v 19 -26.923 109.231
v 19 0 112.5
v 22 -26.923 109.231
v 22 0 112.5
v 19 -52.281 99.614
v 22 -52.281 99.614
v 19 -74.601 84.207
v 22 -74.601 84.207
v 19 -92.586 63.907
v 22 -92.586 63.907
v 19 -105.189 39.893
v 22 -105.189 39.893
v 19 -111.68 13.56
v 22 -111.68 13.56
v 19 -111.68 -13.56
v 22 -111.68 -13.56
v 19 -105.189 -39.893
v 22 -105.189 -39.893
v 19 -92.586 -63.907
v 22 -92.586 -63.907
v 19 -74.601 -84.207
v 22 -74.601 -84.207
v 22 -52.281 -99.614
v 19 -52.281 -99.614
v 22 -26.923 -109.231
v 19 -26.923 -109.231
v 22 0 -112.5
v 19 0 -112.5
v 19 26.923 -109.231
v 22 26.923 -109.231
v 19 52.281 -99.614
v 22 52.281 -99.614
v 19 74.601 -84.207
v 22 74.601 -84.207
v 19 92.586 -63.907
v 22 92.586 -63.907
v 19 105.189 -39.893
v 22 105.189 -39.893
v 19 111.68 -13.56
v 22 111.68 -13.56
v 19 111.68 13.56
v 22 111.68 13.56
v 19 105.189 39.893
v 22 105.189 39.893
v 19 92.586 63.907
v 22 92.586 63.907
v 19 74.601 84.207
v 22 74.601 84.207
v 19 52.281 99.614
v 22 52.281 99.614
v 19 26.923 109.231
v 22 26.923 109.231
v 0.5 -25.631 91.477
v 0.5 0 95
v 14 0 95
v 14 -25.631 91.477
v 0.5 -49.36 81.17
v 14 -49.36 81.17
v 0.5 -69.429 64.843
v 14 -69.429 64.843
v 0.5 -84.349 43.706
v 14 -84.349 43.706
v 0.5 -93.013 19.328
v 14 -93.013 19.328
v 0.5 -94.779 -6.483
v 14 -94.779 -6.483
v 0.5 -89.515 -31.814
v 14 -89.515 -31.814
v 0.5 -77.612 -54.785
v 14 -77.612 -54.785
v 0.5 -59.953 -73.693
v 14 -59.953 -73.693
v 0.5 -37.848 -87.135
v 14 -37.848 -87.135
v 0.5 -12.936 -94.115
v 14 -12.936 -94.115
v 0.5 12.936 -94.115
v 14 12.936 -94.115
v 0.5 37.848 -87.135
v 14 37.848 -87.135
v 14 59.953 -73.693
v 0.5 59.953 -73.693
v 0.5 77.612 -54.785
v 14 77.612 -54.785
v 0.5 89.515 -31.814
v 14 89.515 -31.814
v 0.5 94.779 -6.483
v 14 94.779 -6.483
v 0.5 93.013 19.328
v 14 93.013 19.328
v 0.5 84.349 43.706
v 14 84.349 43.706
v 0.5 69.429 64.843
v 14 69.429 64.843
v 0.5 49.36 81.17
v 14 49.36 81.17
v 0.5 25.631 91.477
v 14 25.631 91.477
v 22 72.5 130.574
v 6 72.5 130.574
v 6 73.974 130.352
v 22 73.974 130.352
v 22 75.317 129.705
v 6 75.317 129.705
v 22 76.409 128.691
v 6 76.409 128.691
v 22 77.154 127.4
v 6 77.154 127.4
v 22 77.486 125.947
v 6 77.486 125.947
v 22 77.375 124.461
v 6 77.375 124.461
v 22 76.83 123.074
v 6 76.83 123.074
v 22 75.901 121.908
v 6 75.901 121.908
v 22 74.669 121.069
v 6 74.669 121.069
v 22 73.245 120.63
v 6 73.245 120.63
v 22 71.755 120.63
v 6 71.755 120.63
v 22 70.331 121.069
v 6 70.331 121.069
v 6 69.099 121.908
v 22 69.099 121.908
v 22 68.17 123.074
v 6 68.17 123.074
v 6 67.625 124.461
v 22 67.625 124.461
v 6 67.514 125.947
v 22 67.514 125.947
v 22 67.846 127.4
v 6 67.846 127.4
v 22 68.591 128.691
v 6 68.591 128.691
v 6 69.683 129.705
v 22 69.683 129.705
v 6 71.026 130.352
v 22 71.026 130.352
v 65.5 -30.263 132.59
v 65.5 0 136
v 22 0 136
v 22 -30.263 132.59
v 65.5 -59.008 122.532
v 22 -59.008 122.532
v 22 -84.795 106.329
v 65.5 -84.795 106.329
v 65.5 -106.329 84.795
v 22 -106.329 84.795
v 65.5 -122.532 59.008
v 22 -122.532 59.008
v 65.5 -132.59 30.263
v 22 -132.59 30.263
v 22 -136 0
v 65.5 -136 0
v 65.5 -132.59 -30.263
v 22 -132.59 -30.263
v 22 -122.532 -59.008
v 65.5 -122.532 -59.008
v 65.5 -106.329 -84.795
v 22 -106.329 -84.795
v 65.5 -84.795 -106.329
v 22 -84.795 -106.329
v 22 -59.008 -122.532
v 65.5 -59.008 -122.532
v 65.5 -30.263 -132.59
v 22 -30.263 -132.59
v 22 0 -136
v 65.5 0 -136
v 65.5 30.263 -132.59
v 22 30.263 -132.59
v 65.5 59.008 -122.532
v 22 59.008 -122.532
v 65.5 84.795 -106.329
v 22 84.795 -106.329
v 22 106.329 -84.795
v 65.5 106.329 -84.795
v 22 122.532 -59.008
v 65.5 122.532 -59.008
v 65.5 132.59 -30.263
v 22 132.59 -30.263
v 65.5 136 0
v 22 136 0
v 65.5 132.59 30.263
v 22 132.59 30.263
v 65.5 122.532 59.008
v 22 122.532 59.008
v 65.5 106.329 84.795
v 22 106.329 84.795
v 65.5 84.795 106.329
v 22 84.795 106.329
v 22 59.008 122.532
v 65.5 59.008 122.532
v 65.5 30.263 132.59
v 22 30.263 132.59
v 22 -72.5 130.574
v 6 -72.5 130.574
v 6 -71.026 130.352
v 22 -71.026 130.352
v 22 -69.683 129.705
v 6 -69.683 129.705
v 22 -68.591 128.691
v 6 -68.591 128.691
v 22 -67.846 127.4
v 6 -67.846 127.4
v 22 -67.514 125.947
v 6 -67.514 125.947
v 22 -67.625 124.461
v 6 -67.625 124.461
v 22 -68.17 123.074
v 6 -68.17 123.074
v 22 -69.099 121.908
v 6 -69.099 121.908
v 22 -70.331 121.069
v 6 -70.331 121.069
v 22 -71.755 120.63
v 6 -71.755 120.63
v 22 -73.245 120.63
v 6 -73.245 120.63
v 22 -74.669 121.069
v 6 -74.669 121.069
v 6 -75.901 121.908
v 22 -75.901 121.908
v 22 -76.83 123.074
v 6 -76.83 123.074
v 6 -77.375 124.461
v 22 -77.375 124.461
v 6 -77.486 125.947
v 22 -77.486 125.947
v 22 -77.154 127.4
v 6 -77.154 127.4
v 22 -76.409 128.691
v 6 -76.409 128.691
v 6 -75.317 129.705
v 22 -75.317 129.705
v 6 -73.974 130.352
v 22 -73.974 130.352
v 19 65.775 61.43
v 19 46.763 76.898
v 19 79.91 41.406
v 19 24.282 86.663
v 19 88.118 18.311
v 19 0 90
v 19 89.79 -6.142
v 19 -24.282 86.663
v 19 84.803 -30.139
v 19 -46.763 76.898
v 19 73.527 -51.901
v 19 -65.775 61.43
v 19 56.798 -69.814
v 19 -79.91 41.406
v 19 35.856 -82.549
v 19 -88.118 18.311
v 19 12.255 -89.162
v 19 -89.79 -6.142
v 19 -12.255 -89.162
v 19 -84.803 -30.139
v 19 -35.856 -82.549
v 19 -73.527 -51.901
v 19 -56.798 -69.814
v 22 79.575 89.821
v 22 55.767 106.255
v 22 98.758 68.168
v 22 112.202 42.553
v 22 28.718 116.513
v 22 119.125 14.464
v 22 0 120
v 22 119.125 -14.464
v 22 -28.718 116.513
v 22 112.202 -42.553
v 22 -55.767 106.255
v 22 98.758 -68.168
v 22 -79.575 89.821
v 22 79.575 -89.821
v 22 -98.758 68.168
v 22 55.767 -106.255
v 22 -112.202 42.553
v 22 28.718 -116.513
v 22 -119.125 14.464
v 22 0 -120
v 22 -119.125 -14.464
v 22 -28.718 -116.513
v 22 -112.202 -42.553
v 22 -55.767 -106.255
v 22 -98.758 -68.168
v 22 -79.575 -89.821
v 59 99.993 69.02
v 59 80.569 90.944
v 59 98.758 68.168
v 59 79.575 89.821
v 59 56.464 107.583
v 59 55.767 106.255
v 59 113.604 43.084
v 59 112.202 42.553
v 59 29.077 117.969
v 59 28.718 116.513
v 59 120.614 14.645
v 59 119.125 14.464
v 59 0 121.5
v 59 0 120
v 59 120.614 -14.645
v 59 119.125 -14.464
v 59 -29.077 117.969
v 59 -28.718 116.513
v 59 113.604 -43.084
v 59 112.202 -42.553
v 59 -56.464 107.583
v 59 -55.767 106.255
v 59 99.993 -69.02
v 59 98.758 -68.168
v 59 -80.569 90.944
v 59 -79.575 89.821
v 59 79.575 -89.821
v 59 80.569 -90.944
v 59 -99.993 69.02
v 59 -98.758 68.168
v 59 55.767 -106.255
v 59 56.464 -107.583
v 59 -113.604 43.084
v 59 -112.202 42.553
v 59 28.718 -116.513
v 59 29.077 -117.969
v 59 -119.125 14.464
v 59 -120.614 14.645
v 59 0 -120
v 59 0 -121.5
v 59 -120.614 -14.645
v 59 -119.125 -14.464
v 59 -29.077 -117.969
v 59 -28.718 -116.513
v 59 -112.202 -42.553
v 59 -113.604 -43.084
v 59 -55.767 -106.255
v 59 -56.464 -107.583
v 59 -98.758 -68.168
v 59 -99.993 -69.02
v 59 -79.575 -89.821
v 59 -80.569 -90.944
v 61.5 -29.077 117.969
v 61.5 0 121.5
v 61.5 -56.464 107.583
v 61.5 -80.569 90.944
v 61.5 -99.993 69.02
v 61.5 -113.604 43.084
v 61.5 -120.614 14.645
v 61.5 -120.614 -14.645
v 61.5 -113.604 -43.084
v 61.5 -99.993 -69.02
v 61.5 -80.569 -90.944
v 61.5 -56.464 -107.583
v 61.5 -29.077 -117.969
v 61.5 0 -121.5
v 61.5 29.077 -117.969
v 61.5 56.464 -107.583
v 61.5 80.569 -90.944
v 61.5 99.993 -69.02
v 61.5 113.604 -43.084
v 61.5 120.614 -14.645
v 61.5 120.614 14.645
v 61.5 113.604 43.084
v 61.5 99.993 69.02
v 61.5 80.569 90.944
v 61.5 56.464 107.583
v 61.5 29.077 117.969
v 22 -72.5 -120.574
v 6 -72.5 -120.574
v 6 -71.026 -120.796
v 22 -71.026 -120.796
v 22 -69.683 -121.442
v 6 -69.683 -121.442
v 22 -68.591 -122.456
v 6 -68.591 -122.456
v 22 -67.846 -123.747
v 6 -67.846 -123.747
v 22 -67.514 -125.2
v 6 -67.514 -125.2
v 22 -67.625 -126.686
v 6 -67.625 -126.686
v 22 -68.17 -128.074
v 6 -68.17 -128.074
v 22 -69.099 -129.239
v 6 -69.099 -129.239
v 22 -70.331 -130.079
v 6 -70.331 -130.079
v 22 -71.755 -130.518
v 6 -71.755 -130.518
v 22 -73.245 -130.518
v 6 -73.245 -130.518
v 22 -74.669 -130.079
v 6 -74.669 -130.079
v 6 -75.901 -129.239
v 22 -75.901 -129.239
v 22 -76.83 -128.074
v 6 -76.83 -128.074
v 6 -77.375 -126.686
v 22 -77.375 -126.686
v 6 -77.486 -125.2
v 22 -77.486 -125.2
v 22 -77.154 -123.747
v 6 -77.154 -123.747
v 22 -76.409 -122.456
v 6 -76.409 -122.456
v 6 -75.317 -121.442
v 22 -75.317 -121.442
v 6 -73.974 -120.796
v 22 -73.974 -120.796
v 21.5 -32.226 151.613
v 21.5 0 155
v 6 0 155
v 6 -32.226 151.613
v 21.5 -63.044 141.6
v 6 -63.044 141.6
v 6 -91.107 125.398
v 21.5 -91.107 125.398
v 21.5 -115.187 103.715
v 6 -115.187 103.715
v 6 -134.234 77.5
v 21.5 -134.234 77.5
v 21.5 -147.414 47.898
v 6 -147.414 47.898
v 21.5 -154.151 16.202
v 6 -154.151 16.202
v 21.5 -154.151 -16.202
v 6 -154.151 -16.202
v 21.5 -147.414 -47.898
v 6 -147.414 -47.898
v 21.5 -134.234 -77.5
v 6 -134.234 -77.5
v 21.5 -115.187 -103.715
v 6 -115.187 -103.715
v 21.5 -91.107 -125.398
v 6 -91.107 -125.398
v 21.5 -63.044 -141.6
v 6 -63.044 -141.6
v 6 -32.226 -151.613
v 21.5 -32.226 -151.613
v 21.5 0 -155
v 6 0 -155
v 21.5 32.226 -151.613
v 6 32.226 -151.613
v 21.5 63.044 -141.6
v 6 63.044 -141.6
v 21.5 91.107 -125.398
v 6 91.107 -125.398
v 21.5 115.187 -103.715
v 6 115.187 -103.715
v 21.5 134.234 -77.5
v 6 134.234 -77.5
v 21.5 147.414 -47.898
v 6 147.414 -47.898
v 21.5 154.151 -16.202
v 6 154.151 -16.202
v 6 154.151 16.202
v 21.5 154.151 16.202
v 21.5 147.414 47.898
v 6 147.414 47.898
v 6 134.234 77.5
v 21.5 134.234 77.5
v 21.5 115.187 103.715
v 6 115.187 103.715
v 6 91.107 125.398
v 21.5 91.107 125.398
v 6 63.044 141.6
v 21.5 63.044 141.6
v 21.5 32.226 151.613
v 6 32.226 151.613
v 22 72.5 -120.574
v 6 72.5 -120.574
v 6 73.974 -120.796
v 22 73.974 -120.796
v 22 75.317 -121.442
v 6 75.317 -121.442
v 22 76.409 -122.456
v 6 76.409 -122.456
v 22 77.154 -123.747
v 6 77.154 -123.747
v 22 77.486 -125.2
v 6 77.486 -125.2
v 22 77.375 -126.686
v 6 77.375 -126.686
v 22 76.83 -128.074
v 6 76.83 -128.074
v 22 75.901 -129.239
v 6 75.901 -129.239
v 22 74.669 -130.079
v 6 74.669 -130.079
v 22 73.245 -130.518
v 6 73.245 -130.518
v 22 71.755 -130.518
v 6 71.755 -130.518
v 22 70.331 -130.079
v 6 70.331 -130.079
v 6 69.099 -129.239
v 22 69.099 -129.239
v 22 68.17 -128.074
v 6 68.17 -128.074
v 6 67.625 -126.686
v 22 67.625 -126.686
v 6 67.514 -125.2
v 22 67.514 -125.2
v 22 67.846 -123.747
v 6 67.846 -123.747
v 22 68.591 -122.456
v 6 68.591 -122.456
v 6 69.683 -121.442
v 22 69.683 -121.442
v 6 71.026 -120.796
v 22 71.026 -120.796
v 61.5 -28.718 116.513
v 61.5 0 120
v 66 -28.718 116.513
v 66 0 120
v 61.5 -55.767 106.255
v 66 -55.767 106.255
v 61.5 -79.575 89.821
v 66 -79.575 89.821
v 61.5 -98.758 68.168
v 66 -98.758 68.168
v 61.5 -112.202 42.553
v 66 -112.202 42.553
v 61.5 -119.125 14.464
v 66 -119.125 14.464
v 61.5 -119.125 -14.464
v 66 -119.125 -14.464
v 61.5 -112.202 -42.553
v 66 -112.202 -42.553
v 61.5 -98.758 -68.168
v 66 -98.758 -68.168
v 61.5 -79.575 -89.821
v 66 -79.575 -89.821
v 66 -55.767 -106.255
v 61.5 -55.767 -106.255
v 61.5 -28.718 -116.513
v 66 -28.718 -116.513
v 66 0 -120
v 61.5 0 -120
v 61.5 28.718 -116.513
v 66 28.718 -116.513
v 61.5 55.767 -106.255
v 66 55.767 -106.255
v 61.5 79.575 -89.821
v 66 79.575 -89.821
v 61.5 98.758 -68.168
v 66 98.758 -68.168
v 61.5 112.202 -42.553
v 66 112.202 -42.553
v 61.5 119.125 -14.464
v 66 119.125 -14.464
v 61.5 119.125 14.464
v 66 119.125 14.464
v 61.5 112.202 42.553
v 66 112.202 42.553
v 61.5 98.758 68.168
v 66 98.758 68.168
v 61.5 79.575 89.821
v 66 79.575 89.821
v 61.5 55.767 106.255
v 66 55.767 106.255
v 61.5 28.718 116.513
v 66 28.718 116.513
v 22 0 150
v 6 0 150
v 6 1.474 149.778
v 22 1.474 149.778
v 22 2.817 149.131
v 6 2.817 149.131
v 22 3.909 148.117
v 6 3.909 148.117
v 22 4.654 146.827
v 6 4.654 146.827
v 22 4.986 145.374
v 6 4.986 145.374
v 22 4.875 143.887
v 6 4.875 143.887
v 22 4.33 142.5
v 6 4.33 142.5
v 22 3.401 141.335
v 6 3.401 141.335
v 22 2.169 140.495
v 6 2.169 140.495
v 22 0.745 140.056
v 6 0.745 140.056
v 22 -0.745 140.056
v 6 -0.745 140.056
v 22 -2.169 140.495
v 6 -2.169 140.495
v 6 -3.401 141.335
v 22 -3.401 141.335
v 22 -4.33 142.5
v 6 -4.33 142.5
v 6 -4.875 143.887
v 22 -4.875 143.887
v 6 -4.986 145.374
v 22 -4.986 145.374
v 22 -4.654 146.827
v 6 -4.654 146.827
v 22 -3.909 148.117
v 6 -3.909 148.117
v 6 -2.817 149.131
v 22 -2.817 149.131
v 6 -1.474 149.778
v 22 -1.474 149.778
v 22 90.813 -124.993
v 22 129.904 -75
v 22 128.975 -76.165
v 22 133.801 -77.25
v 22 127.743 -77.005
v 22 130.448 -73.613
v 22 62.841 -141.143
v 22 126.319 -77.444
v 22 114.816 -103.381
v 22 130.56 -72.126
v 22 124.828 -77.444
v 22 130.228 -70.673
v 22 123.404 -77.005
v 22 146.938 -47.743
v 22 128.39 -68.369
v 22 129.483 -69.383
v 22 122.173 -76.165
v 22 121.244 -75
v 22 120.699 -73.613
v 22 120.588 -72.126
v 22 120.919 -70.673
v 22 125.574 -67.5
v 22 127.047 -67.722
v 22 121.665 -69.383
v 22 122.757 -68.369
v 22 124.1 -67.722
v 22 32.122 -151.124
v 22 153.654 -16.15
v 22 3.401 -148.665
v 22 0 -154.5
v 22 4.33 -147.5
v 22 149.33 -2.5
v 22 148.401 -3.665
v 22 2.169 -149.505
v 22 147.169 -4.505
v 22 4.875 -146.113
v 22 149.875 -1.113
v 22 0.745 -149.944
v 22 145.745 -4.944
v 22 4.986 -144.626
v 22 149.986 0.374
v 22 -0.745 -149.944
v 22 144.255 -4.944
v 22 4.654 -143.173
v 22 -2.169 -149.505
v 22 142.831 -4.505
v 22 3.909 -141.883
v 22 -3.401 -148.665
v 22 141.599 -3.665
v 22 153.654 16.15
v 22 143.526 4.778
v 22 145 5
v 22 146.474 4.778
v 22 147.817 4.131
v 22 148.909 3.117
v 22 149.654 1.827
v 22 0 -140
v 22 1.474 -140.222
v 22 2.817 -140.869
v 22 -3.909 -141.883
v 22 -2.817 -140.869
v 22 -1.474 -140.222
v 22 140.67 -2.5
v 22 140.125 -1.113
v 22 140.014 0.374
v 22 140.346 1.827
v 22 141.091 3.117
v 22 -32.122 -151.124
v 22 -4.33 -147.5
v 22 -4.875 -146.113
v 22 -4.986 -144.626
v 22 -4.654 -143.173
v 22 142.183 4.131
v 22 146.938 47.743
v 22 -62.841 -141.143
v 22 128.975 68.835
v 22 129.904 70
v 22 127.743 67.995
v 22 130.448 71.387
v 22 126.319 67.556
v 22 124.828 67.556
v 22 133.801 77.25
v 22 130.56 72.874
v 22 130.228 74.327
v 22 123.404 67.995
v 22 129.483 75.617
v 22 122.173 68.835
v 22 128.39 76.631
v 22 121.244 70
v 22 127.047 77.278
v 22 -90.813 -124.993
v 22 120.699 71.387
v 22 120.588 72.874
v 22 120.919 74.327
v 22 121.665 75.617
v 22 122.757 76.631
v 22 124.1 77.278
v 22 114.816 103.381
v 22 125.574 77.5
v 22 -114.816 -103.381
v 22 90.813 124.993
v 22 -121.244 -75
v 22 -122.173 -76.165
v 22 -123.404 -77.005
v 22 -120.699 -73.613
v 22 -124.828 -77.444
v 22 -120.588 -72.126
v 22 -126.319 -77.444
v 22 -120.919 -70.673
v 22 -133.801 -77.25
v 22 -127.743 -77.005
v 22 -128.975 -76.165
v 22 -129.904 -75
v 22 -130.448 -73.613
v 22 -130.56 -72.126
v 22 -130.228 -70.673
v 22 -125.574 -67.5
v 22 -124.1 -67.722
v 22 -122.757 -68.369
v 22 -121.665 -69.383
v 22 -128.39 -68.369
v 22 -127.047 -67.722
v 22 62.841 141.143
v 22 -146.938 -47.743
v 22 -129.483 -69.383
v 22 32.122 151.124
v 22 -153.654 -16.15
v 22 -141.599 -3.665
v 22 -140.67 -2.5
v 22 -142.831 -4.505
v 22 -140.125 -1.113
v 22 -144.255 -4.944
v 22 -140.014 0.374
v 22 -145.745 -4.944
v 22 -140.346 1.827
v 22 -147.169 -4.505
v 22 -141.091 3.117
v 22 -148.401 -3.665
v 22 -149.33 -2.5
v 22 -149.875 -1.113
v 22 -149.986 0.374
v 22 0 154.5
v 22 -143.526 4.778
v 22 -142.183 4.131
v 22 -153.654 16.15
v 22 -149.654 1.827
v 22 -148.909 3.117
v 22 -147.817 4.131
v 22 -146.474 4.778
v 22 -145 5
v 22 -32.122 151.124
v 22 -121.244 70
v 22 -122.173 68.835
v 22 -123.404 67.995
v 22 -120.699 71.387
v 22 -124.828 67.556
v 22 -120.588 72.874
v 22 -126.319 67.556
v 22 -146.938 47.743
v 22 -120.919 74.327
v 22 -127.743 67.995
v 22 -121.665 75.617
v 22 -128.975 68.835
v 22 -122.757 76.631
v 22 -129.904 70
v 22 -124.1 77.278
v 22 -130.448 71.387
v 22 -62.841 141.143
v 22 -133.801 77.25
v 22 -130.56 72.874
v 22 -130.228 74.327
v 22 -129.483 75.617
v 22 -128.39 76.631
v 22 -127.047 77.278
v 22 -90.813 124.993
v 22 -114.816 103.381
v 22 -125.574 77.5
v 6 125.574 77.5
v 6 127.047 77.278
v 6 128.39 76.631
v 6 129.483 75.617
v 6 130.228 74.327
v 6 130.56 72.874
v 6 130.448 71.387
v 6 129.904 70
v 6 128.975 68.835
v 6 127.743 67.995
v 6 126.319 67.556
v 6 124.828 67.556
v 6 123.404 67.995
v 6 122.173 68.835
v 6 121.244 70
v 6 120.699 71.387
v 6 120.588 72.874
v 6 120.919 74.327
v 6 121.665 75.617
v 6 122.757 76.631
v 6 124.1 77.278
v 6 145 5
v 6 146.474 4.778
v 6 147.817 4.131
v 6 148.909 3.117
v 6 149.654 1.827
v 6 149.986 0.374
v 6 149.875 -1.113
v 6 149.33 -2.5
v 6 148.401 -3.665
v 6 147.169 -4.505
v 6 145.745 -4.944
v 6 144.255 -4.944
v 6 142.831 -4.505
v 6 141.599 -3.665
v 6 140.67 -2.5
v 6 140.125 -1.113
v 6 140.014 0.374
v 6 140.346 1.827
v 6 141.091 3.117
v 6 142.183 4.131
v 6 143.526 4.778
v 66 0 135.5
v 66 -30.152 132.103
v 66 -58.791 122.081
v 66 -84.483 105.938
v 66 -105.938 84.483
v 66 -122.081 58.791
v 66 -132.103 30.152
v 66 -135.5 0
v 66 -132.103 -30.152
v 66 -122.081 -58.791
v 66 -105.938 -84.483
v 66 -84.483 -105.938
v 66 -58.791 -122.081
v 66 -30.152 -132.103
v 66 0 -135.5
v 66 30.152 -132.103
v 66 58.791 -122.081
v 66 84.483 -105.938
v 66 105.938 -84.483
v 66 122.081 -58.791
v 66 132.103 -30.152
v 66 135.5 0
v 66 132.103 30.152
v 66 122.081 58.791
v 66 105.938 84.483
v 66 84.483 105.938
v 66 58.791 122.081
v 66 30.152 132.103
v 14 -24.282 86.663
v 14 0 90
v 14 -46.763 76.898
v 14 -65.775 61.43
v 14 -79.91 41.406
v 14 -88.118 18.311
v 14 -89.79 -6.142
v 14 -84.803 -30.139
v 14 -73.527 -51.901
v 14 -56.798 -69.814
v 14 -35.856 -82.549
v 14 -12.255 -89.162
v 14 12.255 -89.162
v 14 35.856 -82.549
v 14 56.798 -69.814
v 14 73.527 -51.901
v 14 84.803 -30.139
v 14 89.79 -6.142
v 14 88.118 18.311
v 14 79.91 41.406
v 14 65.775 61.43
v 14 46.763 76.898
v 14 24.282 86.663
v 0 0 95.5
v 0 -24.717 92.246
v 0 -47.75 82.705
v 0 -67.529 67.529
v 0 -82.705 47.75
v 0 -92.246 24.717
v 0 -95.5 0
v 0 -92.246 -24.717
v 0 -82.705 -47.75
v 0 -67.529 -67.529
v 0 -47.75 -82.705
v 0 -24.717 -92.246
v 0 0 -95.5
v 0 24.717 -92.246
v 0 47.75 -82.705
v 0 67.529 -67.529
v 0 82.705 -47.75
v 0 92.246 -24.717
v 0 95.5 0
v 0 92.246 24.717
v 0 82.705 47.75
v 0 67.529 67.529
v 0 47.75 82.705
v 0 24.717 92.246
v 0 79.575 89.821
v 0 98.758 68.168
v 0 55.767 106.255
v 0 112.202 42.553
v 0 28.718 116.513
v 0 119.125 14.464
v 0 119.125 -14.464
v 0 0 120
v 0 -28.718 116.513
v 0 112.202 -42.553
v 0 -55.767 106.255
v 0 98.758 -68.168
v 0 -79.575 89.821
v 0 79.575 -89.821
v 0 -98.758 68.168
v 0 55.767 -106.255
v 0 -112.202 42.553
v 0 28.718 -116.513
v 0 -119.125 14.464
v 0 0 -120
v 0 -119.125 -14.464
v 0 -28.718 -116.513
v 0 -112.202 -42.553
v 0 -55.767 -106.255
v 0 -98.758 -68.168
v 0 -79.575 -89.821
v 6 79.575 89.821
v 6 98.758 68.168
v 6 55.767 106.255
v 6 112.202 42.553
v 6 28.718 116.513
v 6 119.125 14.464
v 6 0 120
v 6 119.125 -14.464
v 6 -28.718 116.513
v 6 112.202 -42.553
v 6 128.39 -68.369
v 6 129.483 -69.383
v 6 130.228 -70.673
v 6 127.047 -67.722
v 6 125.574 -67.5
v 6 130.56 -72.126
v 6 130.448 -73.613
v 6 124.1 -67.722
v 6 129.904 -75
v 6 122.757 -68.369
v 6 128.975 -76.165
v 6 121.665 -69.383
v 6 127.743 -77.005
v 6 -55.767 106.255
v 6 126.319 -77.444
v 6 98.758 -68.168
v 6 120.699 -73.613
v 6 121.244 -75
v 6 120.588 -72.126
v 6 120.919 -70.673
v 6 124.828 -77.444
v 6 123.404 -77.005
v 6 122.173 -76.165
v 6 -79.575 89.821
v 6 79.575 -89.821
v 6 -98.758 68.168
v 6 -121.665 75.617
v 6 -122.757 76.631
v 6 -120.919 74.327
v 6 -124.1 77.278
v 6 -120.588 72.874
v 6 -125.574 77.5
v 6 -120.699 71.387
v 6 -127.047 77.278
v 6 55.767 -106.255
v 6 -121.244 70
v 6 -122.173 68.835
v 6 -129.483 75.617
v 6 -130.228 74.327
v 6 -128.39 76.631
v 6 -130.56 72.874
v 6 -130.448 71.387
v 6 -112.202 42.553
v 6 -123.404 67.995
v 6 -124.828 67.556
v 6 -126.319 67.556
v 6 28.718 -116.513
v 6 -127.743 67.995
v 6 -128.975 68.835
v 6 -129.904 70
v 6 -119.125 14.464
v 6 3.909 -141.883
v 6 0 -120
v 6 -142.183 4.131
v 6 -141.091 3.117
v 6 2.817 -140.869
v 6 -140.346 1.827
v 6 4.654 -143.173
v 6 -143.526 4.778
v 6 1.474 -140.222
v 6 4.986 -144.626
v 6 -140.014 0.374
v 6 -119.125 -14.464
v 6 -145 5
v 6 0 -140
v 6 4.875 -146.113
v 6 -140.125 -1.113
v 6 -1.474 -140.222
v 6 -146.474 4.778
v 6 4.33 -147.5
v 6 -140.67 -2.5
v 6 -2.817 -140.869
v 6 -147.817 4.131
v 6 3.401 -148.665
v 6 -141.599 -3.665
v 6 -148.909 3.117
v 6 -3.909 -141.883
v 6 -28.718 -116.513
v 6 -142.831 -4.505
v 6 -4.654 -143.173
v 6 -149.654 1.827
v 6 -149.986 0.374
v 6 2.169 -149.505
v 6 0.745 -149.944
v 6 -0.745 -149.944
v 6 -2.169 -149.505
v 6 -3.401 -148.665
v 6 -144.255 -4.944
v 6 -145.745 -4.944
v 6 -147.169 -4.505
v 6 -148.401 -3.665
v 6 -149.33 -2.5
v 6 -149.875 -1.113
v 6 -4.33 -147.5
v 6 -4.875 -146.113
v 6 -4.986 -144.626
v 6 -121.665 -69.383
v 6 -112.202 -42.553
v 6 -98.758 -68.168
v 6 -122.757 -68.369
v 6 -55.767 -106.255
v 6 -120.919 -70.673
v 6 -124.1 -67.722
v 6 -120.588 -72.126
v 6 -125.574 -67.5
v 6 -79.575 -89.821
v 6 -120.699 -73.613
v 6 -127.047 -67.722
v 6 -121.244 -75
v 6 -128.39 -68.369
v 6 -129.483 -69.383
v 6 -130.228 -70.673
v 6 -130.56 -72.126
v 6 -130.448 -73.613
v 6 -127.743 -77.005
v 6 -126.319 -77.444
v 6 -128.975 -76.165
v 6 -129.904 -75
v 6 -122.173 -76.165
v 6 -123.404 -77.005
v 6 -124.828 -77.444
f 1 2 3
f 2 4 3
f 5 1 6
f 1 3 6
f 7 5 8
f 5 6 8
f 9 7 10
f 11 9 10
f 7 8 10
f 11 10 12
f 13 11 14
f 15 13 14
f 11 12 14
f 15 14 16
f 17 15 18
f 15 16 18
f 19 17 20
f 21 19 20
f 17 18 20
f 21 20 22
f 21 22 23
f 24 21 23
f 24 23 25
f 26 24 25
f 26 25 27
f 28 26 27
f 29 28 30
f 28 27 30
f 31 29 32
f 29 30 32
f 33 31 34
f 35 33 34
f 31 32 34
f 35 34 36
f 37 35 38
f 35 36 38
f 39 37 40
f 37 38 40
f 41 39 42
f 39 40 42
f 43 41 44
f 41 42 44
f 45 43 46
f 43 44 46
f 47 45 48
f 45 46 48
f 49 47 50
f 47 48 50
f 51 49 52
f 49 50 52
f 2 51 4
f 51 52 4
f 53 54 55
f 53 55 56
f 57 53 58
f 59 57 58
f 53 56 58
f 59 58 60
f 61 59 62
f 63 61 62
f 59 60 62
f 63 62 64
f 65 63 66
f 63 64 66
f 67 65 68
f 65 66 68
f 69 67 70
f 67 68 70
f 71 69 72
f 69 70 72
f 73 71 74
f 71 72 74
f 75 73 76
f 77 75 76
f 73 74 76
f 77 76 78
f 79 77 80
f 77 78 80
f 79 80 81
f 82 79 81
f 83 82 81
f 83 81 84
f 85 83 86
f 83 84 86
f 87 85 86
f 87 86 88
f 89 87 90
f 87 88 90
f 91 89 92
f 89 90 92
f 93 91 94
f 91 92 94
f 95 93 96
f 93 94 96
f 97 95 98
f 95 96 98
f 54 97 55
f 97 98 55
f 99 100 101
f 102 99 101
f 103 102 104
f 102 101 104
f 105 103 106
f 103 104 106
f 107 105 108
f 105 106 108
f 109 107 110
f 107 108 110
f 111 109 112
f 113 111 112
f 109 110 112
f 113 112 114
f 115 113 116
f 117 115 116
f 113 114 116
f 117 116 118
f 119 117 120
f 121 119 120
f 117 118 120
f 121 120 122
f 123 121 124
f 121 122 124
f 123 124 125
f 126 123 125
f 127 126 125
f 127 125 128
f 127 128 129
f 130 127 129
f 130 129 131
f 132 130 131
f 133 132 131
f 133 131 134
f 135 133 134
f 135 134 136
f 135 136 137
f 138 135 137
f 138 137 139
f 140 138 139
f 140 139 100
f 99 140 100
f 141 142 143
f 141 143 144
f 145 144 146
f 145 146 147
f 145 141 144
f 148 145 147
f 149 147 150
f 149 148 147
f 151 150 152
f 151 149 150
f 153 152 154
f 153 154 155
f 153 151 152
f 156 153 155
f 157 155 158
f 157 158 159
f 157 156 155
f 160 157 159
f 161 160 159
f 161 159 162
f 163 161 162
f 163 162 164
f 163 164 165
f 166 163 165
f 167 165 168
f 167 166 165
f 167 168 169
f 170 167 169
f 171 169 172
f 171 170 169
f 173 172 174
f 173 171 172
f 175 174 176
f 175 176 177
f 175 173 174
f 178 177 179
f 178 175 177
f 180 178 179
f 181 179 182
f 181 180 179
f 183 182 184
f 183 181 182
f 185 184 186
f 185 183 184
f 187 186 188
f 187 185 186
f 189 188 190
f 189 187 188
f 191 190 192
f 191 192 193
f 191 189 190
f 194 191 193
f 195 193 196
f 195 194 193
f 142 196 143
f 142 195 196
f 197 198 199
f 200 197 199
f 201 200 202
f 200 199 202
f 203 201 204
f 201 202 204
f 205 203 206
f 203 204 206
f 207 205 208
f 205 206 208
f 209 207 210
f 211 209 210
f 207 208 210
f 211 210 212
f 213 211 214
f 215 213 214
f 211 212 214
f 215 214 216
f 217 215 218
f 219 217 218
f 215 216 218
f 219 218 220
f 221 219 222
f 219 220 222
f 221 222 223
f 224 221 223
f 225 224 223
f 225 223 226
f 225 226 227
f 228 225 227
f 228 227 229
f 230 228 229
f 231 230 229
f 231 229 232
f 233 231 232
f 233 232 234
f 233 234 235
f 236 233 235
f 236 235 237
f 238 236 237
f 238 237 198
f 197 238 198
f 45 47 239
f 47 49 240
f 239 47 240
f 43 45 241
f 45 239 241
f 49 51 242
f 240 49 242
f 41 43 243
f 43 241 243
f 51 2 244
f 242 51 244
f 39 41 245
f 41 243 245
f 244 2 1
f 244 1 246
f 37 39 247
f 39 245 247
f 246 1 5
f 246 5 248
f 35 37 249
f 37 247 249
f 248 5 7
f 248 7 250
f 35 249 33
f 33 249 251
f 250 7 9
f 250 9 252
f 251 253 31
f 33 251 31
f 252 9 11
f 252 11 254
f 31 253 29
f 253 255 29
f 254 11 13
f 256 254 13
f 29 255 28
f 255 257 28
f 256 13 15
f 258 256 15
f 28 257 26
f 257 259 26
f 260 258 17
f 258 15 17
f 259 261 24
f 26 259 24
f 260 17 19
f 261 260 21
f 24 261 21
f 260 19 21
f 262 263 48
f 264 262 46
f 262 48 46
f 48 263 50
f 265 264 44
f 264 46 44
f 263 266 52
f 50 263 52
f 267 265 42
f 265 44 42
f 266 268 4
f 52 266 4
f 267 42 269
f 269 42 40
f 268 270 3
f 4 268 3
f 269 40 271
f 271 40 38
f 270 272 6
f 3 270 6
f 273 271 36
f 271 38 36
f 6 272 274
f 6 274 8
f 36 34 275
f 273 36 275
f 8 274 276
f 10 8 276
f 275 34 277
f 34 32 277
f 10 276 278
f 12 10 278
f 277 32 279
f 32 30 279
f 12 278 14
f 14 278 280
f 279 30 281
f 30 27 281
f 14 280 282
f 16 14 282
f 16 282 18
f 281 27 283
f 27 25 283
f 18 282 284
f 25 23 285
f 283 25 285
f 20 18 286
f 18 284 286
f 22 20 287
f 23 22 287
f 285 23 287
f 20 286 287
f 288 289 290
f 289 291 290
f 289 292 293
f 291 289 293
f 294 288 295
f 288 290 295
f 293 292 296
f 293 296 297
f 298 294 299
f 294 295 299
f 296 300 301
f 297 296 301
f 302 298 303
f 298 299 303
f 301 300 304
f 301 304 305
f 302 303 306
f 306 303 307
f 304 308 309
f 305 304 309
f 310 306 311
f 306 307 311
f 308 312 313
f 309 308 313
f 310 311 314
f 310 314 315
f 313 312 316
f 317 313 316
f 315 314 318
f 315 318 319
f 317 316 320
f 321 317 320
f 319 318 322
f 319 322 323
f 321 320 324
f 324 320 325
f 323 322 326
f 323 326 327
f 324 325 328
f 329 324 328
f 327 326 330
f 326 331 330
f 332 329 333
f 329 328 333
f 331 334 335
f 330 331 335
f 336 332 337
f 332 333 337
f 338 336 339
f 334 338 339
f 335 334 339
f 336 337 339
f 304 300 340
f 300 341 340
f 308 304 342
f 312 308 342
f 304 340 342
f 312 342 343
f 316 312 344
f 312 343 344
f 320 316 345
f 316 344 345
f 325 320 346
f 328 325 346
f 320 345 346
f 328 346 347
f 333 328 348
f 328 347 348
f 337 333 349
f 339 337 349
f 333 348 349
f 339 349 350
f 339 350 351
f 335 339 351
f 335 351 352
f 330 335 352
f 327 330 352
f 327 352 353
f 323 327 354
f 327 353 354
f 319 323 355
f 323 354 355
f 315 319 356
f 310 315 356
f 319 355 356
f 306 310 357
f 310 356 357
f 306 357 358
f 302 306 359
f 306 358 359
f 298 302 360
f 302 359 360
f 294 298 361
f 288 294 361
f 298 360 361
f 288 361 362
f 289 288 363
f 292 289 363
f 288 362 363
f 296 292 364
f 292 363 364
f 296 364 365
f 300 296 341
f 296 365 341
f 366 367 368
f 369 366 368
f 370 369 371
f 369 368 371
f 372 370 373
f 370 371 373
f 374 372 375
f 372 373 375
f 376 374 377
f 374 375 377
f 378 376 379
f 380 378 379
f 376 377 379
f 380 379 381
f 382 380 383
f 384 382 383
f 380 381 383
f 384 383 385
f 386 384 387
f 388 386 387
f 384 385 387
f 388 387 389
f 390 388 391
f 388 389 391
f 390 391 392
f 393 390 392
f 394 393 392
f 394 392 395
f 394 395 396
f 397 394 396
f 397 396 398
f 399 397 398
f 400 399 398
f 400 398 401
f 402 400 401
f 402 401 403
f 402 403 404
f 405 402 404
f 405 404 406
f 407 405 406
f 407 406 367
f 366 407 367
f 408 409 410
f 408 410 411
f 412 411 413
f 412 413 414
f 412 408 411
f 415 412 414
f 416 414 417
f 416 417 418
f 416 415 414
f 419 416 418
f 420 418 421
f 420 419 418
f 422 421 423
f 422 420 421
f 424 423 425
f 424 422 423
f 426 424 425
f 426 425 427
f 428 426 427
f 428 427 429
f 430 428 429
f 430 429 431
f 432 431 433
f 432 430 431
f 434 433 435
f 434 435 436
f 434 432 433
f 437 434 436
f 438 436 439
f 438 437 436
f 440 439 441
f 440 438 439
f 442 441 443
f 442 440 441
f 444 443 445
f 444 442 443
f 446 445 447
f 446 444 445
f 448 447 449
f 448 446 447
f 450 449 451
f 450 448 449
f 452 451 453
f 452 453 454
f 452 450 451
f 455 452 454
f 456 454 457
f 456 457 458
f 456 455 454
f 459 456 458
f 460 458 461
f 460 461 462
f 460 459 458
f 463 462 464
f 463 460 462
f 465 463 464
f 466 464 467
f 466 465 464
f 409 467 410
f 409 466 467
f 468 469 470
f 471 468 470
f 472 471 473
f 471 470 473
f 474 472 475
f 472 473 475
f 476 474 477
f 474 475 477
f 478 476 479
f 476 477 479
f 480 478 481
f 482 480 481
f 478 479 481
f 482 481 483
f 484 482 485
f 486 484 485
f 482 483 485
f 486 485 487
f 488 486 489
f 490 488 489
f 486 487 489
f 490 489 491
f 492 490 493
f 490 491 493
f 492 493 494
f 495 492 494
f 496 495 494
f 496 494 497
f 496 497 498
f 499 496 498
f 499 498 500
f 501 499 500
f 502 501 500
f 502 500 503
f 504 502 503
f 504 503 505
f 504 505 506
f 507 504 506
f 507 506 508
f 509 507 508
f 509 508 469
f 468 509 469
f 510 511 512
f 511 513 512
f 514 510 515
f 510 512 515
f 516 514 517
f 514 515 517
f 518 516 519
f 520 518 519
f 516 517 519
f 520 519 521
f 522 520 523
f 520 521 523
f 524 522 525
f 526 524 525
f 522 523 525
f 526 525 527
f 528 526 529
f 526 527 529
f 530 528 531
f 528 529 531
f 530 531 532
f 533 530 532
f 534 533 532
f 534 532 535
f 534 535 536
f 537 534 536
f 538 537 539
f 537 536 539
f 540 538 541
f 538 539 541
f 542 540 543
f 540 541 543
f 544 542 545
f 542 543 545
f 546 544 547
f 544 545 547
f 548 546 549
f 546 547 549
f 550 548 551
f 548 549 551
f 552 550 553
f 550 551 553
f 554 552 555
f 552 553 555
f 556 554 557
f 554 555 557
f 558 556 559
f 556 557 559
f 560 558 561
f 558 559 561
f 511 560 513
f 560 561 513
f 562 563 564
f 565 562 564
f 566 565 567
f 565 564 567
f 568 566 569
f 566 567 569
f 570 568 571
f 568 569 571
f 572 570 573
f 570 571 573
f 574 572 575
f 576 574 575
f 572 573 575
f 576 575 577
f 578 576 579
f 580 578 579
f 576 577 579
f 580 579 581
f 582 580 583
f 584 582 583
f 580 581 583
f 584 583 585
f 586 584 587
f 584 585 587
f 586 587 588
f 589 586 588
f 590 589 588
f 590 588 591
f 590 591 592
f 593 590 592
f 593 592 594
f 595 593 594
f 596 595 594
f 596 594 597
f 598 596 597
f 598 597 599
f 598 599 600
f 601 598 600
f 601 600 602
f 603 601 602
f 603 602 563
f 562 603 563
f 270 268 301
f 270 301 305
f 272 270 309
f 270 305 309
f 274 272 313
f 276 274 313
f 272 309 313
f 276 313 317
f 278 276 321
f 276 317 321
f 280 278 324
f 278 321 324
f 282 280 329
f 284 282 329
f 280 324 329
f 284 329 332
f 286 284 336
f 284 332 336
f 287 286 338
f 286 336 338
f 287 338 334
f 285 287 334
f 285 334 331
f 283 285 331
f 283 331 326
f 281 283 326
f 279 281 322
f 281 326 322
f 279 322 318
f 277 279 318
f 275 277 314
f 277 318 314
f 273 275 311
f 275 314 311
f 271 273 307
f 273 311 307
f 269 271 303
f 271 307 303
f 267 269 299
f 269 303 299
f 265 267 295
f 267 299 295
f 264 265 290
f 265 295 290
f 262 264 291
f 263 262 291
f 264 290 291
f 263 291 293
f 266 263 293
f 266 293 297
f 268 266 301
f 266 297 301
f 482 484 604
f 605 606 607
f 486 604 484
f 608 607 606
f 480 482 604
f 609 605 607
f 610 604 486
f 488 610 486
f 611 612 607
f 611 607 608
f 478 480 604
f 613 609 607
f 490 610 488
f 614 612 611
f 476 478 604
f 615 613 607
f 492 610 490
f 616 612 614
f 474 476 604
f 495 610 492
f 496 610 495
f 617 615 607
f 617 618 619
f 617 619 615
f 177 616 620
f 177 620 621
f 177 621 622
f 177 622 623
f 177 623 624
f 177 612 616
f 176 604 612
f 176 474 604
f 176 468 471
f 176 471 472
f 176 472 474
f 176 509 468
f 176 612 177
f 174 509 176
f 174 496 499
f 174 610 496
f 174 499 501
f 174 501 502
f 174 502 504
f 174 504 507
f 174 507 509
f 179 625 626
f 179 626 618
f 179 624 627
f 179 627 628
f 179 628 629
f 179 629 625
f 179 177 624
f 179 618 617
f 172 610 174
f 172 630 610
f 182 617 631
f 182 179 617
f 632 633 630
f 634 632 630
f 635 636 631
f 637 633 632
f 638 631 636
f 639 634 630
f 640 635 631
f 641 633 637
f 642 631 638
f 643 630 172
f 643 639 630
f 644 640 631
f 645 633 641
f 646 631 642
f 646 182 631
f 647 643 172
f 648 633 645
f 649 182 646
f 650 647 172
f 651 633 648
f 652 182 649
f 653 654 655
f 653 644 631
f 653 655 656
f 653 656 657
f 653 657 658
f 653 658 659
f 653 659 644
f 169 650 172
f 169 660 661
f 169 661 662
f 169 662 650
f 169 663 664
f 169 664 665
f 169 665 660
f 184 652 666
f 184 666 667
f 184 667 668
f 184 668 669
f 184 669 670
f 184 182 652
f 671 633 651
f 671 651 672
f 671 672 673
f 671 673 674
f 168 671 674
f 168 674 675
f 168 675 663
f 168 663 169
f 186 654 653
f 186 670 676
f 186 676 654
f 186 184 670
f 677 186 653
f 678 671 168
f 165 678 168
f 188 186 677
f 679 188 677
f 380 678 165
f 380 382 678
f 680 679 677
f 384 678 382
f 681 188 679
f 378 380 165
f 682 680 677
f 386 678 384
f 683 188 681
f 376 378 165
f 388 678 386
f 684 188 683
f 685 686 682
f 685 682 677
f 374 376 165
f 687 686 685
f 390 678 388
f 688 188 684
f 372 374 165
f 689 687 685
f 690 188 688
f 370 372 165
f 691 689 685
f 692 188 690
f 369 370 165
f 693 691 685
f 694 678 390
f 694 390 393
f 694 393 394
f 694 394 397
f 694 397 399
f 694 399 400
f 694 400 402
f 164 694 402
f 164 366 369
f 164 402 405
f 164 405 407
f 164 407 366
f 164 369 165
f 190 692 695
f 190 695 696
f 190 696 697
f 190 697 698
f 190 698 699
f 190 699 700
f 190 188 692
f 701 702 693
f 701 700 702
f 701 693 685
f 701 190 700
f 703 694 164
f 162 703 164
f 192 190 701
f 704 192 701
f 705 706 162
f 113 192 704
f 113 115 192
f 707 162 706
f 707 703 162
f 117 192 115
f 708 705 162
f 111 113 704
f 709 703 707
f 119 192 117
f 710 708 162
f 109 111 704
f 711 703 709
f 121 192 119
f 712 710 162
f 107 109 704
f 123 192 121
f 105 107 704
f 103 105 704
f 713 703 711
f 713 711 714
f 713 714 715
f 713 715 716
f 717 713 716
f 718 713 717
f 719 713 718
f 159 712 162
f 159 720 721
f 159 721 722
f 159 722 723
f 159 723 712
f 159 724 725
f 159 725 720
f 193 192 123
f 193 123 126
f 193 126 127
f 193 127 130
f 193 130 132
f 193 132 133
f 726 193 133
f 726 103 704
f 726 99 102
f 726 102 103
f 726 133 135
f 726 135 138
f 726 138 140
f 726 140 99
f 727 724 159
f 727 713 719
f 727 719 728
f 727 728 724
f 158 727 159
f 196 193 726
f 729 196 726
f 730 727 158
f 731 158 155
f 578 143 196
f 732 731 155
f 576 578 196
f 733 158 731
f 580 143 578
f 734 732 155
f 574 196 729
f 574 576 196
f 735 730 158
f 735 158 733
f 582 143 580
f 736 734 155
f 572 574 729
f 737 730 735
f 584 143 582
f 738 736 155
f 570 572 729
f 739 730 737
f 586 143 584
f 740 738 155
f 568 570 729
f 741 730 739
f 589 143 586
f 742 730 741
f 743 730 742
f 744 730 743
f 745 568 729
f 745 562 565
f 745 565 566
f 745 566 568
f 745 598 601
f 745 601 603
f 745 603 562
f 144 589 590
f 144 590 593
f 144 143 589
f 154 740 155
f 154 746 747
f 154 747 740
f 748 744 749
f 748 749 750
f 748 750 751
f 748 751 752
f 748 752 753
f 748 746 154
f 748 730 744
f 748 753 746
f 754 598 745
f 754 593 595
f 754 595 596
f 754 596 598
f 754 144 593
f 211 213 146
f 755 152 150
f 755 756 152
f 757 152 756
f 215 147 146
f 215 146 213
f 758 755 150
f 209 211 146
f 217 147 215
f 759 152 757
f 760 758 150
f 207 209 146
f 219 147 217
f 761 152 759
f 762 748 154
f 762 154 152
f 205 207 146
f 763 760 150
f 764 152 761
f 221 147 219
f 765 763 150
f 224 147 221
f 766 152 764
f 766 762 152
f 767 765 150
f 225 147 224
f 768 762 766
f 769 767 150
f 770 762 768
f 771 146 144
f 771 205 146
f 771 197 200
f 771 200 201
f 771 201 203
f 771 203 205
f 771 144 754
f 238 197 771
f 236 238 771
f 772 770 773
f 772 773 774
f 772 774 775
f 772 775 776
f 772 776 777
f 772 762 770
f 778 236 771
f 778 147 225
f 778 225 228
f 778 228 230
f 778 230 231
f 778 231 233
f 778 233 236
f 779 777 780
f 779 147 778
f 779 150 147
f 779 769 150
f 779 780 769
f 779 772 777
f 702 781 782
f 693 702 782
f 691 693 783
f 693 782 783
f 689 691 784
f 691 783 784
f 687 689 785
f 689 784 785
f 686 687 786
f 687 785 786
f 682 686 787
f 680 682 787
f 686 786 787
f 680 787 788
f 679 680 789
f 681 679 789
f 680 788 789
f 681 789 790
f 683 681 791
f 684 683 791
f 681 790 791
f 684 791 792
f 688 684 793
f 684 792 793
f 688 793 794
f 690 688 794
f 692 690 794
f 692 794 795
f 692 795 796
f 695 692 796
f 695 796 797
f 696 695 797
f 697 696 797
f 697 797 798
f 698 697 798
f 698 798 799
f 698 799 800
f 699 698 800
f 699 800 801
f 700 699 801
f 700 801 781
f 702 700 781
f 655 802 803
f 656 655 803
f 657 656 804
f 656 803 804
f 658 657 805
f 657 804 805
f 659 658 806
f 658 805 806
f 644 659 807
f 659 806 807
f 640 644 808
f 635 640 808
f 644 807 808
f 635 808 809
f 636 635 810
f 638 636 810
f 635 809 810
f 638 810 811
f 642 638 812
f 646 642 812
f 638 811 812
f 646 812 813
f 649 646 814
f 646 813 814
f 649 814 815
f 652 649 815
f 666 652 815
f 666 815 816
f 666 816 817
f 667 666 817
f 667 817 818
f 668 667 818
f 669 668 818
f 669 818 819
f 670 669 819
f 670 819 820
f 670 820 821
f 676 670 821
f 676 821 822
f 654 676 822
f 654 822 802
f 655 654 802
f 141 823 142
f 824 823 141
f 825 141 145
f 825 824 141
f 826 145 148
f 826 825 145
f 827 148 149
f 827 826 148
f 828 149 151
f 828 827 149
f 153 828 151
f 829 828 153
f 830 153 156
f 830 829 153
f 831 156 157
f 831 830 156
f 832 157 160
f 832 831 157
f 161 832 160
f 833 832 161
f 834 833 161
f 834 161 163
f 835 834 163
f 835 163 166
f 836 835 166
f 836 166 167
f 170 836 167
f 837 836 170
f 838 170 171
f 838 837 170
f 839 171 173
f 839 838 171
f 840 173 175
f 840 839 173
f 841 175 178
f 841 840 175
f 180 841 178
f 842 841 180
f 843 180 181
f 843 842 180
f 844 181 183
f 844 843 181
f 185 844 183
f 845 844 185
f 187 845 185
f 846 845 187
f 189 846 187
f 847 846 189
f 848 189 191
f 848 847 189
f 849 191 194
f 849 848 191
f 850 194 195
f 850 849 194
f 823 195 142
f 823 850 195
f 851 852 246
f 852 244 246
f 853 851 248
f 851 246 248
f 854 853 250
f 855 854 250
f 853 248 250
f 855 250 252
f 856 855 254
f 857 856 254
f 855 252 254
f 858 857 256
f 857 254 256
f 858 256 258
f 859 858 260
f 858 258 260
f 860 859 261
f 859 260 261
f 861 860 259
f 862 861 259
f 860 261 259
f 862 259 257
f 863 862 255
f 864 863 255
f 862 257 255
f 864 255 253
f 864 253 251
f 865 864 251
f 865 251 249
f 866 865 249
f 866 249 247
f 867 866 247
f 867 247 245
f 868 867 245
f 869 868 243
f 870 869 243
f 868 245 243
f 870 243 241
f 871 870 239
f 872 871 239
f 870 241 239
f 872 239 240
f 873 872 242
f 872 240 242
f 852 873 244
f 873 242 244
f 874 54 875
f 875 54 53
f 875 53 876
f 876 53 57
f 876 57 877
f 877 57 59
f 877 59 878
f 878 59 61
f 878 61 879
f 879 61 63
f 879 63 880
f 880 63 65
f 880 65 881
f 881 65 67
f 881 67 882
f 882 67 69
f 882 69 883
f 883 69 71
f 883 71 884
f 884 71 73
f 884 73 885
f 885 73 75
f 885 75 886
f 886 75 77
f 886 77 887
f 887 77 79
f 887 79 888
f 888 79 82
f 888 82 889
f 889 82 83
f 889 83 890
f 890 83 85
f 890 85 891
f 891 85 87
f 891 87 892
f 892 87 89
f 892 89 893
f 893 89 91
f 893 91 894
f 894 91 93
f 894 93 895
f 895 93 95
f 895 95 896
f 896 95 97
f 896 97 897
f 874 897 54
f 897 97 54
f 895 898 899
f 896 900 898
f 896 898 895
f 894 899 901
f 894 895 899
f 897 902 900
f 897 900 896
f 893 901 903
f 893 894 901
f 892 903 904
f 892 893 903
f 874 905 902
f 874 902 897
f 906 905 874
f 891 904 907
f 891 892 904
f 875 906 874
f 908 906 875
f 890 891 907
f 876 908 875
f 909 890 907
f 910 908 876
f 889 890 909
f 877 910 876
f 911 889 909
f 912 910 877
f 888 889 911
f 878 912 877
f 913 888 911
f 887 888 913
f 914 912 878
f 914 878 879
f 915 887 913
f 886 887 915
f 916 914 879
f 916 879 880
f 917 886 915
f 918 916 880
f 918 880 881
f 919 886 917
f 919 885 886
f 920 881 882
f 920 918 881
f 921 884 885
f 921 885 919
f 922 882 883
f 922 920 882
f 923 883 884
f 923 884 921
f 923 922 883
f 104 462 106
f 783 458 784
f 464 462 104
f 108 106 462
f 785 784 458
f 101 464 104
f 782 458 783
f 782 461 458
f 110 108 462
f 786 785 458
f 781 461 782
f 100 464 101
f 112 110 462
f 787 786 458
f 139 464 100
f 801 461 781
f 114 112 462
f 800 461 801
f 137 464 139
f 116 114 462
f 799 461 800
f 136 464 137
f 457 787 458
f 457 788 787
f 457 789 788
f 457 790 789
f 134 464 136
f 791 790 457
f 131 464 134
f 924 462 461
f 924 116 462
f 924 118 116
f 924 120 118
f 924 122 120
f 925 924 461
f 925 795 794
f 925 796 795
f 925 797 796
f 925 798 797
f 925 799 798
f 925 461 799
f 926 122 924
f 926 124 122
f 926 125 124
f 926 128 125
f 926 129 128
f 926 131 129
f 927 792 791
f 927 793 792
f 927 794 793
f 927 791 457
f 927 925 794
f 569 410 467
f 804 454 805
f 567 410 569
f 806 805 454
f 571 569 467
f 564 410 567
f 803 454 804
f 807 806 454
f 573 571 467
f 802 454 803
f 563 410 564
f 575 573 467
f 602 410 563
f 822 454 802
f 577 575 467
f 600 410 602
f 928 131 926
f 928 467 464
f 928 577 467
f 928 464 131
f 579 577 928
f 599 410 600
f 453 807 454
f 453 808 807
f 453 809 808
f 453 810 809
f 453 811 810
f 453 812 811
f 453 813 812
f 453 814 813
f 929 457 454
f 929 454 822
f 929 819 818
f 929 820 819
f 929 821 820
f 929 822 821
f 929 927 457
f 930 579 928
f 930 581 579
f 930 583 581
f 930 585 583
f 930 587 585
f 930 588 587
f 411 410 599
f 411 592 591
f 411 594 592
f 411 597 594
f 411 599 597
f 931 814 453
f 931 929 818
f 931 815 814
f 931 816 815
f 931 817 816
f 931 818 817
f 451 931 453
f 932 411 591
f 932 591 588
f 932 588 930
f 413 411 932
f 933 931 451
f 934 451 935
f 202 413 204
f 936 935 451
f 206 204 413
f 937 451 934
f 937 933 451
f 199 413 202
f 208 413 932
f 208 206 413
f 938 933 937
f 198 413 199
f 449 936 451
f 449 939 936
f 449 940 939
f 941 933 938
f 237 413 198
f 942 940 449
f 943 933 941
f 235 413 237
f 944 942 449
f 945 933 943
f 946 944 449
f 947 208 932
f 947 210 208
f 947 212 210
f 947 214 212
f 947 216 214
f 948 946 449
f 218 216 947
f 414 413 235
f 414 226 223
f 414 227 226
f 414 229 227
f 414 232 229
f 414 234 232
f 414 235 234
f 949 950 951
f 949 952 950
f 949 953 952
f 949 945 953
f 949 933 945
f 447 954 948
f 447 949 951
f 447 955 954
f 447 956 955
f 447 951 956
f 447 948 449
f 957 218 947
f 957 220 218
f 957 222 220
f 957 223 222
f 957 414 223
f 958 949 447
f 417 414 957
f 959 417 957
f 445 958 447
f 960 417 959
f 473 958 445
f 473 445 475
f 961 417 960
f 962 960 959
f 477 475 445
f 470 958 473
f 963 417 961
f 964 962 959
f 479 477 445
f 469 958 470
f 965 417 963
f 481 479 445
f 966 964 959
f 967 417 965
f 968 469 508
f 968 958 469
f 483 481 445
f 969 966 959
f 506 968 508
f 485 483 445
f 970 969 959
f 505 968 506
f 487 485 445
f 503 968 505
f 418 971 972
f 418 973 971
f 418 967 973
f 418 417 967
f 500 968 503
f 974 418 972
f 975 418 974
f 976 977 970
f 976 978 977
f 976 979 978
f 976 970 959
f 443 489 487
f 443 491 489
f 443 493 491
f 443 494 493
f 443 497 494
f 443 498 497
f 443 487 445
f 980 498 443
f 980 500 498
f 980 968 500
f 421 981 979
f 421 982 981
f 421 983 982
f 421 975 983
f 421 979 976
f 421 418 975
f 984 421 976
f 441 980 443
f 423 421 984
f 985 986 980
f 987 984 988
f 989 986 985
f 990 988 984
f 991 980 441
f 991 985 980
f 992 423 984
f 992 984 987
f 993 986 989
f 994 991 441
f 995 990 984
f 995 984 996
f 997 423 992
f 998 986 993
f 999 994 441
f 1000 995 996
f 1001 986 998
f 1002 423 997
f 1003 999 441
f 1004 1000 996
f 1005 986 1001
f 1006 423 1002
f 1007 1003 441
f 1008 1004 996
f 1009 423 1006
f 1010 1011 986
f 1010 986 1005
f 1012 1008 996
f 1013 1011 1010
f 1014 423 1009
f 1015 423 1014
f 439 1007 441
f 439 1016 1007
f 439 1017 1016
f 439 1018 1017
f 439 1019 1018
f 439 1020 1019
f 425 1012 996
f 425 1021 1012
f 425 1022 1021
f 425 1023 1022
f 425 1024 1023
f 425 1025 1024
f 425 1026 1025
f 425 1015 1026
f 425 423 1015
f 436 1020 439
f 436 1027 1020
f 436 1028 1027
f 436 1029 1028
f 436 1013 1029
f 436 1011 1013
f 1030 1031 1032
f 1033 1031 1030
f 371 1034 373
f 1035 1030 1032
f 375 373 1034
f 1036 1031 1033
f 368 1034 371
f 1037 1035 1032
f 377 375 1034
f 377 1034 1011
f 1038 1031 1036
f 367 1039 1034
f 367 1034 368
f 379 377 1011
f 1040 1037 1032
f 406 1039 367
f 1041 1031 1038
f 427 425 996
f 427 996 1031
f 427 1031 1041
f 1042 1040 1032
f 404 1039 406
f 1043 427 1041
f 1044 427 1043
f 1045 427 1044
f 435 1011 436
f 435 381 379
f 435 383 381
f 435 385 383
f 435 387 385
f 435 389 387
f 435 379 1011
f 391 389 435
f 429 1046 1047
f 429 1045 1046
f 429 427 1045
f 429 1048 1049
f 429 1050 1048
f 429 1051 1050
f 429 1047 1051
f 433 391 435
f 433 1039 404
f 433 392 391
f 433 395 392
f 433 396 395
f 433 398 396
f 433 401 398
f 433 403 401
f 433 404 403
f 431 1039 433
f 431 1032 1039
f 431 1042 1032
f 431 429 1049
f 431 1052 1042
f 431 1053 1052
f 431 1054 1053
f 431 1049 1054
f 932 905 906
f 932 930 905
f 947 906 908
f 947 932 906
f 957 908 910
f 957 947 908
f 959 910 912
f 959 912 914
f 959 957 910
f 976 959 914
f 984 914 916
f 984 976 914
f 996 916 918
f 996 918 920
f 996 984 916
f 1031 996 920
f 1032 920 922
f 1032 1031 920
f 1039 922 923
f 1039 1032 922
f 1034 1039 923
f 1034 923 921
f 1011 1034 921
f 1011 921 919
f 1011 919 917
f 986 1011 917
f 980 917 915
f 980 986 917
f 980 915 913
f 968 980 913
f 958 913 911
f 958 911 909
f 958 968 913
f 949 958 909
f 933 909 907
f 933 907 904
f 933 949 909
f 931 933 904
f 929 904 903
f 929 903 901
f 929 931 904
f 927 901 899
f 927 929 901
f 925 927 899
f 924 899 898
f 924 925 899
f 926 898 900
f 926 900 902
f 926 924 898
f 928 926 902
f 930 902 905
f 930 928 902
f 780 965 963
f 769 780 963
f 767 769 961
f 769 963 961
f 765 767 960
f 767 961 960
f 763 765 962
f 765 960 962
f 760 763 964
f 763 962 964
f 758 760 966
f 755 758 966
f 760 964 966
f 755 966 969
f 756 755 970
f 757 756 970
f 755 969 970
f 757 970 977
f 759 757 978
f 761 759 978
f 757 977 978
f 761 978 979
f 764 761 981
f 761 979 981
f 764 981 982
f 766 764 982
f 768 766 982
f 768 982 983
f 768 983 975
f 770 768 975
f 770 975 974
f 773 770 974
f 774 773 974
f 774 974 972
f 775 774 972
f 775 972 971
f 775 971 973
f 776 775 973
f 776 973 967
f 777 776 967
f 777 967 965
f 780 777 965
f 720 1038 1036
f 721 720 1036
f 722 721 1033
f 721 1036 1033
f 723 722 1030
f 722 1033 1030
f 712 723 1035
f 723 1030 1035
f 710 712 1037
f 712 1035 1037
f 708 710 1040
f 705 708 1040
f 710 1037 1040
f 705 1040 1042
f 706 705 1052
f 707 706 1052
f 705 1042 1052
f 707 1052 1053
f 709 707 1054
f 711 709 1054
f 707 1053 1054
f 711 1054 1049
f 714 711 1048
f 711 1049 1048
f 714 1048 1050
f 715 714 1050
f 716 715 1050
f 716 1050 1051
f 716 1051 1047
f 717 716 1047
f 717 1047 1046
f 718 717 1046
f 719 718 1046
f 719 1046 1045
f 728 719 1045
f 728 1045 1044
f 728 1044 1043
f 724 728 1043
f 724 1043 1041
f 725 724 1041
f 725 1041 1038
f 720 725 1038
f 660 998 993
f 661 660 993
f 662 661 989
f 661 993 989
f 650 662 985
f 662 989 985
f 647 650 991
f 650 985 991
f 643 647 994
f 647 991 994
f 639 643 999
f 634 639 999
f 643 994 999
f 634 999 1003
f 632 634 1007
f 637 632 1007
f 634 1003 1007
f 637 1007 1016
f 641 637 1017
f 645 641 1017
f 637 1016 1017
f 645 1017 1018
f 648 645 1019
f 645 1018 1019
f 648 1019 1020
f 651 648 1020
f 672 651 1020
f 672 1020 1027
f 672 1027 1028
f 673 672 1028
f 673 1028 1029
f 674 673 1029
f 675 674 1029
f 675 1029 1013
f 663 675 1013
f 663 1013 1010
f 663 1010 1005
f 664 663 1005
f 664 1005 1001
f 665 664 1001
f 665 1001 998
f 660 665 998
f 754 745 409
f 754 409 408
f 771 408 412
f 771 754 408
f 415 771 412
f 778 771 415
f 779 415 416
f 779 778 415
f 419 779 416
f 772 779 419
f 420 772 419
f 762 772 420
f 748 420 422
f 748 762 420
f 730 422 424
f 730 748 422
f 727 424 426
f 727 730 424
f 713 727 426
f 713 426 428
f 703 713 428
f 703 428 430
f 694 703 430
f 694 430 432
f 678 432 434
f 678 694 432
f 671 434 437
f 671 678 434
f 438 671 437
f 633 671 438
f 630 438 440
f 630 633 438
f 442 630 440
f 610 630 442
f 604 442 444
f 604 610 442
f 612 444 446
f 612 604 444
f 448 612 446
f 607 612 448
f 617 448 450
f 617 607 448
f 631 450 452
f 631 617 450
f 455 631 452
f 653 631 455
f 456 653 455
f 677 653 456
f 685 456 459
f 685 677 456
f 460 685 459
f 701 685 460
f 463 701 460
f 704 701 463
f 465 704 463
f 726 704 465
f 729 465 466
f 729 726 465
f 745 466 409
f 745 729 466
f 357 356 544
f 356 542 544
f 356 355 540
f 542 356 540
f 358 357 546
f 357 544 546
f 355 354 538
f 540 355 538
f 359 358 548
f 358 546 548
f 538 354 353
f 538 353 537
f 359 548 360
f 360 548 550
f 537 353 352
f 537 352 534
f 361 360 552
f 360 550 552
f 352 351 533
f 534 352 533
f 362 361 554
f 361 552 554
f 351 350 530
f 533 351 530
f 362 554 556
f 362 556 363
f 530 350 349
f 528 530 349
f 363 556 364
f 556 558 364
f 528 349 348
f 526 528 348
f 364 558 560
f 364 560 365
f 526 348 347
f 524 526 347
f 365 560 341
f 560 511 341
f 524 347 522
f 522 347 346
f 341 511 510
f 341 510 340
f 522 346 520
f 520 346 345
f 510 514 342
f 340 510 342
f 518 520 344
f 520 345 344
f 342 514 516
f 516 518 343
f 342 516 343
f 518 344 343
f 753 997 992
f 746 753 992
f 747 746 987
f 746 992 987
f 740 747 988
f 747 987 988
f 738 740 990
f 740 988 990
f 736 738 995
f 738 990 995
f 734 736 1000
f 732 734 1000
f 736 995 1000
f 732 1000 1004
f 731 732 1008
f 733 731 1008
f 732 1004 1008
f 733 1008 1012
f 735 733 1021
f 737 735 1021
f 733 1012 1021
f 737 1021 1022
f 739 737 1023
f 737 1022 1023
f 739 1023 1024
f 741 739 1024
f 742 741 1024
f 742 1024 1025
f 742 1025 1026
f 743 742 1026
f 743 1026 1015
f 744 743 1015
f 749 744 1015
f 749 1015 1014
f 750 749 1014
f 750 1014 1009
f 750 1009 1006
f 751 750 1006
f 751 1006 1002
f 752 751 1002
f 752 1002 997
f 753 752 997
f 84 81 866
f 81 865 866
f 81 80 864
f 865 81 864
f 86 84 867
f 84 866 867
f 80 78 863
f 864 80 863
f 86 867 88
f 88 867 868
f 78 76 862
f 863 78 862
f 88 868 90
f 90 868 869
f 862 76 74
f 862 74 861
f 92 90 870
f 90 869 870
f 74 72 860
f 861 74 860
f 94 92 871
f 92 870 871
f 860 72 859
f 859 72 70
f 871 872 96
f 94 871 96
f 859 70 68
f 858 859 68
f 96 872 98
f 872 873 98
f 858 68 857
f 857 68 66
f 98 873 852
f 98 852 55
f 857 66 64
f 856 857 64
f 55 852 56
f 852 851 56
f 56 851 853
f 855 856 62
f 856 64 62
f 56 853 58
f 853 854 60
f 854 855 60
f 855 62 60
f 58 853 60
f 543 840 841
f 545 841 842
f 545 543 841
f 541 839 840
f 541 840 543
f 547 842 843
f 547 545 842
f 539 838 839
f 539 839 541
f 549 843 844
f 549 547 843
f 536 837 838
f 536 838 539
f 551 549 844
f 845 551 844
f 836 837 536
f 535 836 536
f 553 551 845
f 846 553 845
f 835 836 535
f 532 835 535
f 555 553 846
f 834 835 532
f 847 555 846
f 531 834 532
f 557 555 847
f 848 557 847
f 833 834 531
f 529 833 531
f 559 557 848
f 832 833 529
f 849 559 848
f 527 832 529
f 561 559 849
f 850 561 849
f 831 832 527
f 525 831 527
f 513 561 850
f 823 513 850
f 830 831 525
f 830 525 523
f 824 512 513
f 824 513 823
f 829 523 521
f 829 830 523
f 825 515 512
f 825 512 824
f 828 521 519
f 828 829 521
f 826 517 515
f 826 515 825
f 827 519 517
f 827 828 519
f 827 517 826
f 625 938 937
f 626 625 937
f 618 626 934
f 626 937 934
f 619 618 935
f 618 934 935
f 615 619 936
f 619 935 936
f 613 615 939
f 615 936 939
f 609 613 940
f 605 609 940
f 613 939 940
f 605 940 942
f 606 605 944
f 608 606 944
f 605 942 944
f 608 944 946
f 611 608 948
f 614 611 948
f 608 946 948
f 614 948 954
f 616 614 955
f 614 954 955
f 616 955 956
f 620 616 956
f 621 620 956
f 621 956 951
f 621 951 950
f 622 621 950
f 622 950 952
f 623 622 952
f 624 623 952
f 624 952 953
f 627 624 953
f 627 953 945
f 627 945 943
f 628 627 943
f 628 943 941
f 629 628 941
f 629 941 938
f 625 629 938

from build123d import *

# Parameters (mm, degrees)
SKETCH_3_R          = 5
CUT_EXTRUDE_1_DEPTH = 228.266363547
CHAMFER_1_SIZE      = 0.5


with BuildPart() as part:
    # 草图1 → 旋转1 (revolve)
    with BuildSketch(Plane.XY, mode=Mode.PRIVATE) as revolve_1_sk:
        Polygon((0, 0), (0, 120), (6, 120), (6, 155), (22, 155), (22, 136), (66, 136), (66, 0), align=None)
    revolve(revolve_1_sk.sketch.rotate(Axis((0, 0, 0), (1, 0, 0)), 90), axis=Axis((0, 0, 0), (1, 0, 0)))

    # 草图2 → 切除-旋转1 (revolve, cut)
    with BuildSketch(Plane.XY, mode=Mode.PRIVATE) as cut_revolve_1_sk:
        Polygon((0, 0), (0, 95), (14, 95), (14, 90), (19, 90), (19, 112.5), (22, 112.5), (22, 120), (59, 120), (59, 121.5), (61.5, 121.5), (61.5, 120), (66, 120), (66, 0), align=None)
    revolve(cut_revolve_1_sk.sketch.rotate(Axis((0, 0, 0), (1, 0, 0)), 90), axis=Axis((0, 0, 0), (1, 0, 0)), mode=Mode.SUBTRACT)

    # 草图3 → 切除-拉伸1 (cut, through all)
    with BuildSketch(Plane.ZY.offset(-6)):
        with Locations((0, 145)):
            Circle(SKETCH_3_R)
        with Locations((72.5, 125.573683549)):
            Circle(SKETCH_3_R)
        with Locations((125.573683549, 72.5)):
            Circle(SKETCH_3_R)
        with Locations((145, 0)):
            Circle(SKETCH_3_R)
        with Locations((125.573683549, -72.5)):
            Circle(SKETCH_3_R)
        with Locations((72.5, -125.573683549)):
            Circle(SKETCH_3_R)
        with Locations((0, -145)):
            Circle(SKETCH_3_R)
        with Locations((-72.5, -125.573683549)):
            Circle(SKETCH_3_R)
        with Locations((-125.573683549, -72.5)):
            Circle(SKETCH_3_R)
        with Locations((-145, 0)):
            Circle(SKETCH_3_R)
        with Locations((-125.573683549, 72.5)):
            Circle(SKETCH_3_R)
        with Locations((-72.5, 125.573683549)):
            Circle(SKETCH_3_R)
    extrude(amount=-CUT_EXTRUDE_1_DEPTH, mode=Mode.SUBTRACT)

    # 倒角1
    chamfer_1_edges = [part.edges().sort_by_distance(p)[0] for p in [
        (0, 0, -95),
        (66, 0, -136),
        (22, 0, -155),
    ]]
    chamfer(chamfer_1_edges, length=CHAMFER_1_SIZE)


solid = part.part
